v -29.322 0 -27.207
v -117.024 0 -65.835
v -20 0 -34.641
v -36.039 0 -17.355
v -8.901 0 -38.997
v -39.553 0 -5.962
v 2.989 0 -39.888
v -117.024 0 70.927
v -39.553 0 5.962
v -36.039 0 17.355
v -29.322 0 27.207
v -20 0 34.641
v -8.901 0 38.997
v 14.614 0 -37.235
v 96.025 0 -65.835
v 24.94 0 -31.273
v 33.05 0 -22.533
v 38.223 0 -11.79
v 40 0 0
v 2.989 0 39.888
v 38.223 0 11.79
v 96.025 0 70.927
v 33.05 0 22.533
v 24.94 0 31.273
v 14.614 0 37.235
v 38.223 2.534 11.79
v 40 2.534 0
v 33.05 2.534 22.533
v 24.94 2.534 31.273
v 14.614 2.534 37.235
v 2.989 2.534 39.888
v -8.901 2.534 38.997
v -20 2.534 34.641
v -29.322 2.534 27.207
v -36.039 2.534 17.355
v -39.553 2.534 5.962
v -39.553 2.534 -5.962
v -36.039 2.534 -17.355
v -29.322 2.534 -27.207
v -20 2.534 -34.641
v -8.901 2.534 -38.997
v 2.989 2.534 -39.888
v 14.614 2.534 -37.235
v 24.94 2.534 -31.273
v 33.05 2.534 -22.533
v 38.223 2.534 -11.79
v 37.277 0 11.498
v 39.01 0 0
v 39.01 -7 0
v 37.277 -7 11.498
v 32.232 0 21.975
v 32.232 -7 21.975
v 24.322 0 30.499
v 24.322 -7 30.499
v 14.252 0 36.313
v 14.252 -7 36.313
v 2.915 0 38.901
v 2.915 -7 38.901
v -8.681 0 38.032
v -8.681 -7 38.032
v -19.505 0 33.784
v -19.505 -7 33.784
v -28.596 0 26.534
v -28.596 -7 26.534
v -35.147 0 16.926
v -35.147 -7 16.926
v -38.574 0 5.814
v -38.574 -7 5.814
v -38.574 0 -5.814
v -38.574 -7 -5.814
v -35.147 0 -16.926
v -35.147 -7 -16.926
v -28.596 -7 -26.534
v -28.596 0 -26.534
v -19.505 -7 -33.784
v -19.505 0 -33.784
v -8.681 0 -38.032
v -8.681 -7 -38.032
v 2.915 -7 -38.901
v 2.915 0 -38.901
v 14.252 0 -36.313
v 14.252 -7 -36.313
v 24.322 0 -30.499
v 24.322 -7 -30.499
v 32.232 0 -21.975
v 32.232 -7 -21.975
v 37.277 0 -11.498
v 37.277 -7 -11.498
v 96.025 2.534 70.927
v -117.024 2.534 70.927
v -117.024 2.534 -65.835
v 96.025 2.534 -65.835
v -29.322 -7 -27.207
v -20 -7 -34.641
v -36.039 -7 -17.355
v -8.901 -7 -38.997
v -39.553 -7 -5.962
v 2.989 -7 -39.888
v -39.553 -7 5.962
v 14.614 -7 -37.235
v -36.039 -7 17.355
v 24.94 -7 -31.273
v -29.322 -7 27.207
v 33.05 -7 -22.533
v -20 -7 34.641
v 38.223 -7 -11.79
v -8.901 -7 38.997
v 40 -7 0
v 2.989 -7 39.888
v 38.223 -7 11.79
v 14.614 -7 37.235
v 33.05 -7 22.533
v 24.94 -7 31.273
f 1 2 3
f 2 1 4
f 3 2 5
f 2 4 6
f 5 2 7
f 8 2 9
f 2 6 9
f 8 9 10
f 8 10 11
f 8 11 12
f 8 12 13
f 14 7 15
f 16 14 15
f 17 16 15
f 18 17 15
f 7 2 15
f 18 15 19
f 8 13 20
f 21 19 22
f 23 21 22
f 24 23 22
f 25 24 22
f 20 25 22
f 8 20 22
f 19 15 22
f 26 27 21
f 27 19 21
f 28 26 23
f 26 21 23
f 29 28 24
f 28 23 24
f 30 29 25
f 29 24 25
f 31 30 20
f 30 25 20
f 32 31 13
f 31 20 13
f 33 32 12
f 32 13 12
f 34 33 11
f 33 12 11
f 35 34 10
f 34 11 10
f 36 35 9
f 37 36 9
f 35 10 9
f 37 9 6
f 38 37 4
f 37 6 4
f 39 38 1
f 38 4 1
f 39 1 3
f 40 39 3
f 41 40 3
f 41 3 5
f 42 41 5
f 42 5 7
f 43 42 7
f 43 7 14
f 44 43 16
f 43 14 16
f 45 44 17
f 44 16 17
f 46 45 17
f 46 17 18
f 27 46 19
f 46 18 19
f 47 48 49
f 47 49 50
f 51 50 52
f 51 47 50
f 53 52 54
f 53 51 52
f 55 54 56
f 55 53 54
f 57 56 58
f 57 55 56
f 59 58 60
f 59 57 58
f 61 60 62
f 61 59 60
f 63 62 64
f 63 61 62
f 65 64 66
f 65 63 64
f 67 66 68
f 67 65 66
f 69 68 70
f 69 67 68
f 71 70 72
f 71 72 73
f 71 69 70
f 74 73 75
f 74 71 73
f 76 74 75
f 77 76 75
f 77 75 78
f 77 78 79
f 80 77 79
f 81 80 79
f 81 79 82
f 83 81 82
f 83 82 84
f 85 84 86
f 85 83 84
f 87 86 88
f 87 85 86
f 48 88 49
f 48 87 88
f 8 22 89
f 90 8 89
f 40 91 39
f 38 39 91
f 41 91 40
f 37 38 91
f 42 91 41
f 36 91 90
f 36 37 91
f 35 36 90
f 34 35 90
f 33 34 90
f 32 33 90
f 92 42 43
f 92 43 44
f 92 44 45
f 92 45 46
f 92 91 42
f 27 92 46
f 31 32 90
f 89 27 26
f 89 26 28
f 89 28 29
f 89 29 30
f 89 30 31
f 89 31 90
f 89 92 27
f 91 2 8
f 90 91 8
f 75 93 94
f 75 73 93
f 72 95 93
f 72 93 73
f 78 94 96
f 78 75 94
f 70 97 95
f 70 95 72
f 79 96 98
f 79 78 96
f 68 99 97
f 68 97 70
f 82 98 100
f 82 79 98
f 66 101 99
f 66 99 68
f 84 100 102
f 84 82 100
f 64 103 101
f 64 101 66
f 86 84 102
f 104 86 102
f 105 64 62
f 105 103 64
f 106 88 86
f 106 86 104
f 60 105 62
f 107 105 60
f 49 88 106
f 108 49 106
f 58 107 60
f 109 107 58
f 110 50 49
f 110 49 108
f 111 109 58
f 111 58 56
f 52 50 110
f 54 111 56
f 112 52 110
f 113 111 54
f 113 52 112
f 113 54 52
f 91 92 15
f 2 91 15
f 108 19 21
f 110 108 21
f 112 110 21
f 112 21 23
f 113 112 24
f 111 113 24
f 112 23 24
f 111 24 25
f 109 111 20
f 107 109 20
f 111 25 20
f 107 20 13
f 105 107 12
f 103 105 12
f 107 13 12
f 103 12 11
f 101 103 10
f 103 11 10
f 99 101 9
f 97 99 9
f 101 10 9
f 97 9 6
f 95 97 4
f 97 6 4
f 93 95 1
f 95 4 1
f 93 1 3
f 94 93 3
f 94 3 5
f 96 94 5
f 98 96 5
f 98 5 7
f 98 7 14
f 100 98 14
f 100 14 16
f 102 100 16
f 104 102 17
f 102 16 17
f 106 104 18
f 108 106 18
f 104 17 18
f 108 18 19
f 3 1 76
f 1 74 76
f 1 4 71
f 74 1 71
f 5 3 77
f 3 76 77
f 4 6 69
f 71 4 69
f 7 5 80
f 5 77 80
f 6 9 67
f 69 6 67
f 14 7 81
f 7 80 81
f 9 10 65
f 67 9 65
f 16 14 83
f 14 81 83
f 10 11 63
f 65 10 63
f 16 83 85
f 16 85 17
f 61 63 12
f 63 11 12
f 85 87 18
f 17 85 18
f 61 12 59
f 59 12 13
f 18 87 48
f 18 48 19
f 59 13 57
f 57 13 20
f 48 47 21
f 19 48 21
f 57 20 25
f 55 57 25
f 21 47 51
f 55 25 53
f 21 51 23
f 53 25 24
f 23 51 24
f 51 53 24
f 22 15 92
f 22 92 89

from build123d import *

# Parameters (mm, degrees)
F0_R     = 40
F0_R_2   = 39.0100009527
F1_DEPTH = 7
F0_W     = 188.0487501621
F0_H     = 136.7627084255
F2_DEPTH = 0.9340215474
F3_DEPTH = 9.6
F4_DEPTH = 25
F5_DEPTH = 8


with BuildPart() as f1:
    # F0 (on Front) → F1 (new body)
    with BuildSketch(Plane.XZ):
        Circle(F0_R)
        Circle(F0_R_2, mode=Mode.SUBTRACT)
    extrude(amount=F1_DEPTH)


with BuildPart() as f2:
    # F0 (on Front) → F2 (new body)
    with BuildSketch(Plane.XZ):
        with Locations((2.0005255938, 2.5461316109)):
            Rectangle(F0_W, F0_H)
        Circle(F0_R, mode=Mode.SUBTRACT)
    extrude(amount=-F2_DEPTH)

    # F3 (add): a face of the model
    f3_faces = [f2.faces().sort_by_distance(p)[0] for p in [
        (2.0005255938, 0.9340215474, 68.6022681811),
    ]]
    extrude(f3_faces, amount=F3_DEPTH)

    # F4 (add): faces of the model
    f4_faces = [f2.faces().sort_by_distance(p)[0] for p in [
        (-92.0238494873, 5.2670107737, 2.5461316109),
        (96.0249006748, 5.2670107737, 2.5461316109),
    ]]
    extrude(f4_faces, amount=F4_DEPTH, dir=(-1, 0, 0))

    # F5 (cut): a face of the model
    f5_faces = [f2.faces().sort_by_distance(p)[0] for p in [
        (93.493225175, 10.5340215474, 2.5461316109),
    ]]
    extrude(f5_faces, amount=-F5_DEPTH, mode=Mode.SUBTRACT)


solid = Compound([f1.part, f2.part])
